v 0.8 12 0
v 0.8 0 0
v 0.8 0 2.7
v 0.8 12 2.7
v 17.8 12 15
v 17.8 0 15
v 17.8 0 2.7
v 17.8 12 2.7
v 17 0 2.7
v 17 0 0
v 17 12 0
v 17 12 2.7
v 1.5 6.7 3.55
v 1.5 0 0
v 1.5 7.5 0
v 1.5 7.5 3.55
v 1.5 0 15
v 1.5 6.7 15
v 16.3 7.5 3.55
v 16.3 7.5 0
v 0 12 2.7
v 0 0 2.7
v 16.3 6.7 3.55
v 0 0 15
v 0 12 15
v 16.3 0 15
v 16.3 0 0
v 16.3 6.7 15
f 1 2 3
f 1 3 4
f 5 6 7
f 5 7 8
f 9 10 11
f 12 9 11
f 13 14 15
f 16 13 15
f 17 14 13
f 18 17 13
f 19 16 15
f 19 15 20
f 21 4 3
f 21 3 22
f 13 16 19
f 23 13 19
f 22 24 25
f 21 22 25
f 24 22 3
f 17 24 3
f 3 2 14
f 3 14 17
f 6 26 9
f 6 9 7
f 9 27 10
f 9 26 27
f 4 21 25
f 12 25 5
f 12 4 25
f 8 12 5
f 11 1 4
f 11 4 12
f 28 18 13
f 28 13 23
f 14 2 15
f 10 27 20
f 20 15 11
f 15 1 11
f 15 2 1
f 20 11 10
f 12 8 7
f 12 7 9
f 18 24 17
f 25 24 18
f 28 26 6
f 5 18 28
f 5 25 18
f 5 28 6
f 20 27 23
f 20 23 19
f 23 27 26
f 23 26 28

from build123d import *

# Parameters (mm, degrees)
SKETCH1_W           = 17.8
SKETCH1_H           = 12
BOSS_EXTRUDE1_DEPTH = 15
SKETCH2_W           = 14.8
SKETCH2_H           = 7.5
CUT_EXTRUDE1_DEPTH  = 27.188547115
SKETCH3_W           = 14.8
SKETCH3_H           = 11.449984897
BOSS_EXTRUDE2_DEPTH = 0.8
SKETCH4_W           = 0.8
SKETCH4_H           = 12
CUT_EXTRUDE2_DEPTH  = 2.7


with BuildPart() as part:
    # Sketch1 → Boss-Extrude1 (new body)
    with BuildSketch(Plane.XY):
        with Locations((8.9, 6)):
            Rectangle(SKETCH1_W, SKETCH1_H)
    extrude(amount=BOSS_EXTRUDE1_DEPTH)

    # Sketch2 → Cut-Extrude1 (cut, through all)
    with BuildSketch(Plane.XY.offset(15)):
        with Locations((8.9, 3.75)):
            Rectangle(SKETCH2_W, SKETCH2_H)
    extrude(amount=-CUT_EXTRUDE1_DEPTH, mode=Mode.SUBTRACT)

    # Sketch3 → Boss-Extrude2 (add)
    with BuildSketch(Plane.XZ.offset(-7.5)):
        with Locations((8.9, 9.275007552)):
            Rectangle(SKETCH3_W, SKETCH3_H)
    extrude(amount=BOSS_EXTRUDE2_DEPTH)

    # Sketch4 → Cut-Extrude2 (cut)
    with BuildSketch(Plane(origin=(0, 0, 0), x_dir=(-1, 0, 0), z_dir=(0, 0, -1))):
        with Locations((-17.4, 6)):
            Rectangle(SKETCH4_W, SKETCH4_H)
        with Locations((-0.4, 6)):
            Rectangle(SKETCH4_W, SKETCH4_H)
    extrude(amount=-CUT_EXTRUDE2_DEPTH, mode=Mode.SUBTRACT)


solid = part.part
